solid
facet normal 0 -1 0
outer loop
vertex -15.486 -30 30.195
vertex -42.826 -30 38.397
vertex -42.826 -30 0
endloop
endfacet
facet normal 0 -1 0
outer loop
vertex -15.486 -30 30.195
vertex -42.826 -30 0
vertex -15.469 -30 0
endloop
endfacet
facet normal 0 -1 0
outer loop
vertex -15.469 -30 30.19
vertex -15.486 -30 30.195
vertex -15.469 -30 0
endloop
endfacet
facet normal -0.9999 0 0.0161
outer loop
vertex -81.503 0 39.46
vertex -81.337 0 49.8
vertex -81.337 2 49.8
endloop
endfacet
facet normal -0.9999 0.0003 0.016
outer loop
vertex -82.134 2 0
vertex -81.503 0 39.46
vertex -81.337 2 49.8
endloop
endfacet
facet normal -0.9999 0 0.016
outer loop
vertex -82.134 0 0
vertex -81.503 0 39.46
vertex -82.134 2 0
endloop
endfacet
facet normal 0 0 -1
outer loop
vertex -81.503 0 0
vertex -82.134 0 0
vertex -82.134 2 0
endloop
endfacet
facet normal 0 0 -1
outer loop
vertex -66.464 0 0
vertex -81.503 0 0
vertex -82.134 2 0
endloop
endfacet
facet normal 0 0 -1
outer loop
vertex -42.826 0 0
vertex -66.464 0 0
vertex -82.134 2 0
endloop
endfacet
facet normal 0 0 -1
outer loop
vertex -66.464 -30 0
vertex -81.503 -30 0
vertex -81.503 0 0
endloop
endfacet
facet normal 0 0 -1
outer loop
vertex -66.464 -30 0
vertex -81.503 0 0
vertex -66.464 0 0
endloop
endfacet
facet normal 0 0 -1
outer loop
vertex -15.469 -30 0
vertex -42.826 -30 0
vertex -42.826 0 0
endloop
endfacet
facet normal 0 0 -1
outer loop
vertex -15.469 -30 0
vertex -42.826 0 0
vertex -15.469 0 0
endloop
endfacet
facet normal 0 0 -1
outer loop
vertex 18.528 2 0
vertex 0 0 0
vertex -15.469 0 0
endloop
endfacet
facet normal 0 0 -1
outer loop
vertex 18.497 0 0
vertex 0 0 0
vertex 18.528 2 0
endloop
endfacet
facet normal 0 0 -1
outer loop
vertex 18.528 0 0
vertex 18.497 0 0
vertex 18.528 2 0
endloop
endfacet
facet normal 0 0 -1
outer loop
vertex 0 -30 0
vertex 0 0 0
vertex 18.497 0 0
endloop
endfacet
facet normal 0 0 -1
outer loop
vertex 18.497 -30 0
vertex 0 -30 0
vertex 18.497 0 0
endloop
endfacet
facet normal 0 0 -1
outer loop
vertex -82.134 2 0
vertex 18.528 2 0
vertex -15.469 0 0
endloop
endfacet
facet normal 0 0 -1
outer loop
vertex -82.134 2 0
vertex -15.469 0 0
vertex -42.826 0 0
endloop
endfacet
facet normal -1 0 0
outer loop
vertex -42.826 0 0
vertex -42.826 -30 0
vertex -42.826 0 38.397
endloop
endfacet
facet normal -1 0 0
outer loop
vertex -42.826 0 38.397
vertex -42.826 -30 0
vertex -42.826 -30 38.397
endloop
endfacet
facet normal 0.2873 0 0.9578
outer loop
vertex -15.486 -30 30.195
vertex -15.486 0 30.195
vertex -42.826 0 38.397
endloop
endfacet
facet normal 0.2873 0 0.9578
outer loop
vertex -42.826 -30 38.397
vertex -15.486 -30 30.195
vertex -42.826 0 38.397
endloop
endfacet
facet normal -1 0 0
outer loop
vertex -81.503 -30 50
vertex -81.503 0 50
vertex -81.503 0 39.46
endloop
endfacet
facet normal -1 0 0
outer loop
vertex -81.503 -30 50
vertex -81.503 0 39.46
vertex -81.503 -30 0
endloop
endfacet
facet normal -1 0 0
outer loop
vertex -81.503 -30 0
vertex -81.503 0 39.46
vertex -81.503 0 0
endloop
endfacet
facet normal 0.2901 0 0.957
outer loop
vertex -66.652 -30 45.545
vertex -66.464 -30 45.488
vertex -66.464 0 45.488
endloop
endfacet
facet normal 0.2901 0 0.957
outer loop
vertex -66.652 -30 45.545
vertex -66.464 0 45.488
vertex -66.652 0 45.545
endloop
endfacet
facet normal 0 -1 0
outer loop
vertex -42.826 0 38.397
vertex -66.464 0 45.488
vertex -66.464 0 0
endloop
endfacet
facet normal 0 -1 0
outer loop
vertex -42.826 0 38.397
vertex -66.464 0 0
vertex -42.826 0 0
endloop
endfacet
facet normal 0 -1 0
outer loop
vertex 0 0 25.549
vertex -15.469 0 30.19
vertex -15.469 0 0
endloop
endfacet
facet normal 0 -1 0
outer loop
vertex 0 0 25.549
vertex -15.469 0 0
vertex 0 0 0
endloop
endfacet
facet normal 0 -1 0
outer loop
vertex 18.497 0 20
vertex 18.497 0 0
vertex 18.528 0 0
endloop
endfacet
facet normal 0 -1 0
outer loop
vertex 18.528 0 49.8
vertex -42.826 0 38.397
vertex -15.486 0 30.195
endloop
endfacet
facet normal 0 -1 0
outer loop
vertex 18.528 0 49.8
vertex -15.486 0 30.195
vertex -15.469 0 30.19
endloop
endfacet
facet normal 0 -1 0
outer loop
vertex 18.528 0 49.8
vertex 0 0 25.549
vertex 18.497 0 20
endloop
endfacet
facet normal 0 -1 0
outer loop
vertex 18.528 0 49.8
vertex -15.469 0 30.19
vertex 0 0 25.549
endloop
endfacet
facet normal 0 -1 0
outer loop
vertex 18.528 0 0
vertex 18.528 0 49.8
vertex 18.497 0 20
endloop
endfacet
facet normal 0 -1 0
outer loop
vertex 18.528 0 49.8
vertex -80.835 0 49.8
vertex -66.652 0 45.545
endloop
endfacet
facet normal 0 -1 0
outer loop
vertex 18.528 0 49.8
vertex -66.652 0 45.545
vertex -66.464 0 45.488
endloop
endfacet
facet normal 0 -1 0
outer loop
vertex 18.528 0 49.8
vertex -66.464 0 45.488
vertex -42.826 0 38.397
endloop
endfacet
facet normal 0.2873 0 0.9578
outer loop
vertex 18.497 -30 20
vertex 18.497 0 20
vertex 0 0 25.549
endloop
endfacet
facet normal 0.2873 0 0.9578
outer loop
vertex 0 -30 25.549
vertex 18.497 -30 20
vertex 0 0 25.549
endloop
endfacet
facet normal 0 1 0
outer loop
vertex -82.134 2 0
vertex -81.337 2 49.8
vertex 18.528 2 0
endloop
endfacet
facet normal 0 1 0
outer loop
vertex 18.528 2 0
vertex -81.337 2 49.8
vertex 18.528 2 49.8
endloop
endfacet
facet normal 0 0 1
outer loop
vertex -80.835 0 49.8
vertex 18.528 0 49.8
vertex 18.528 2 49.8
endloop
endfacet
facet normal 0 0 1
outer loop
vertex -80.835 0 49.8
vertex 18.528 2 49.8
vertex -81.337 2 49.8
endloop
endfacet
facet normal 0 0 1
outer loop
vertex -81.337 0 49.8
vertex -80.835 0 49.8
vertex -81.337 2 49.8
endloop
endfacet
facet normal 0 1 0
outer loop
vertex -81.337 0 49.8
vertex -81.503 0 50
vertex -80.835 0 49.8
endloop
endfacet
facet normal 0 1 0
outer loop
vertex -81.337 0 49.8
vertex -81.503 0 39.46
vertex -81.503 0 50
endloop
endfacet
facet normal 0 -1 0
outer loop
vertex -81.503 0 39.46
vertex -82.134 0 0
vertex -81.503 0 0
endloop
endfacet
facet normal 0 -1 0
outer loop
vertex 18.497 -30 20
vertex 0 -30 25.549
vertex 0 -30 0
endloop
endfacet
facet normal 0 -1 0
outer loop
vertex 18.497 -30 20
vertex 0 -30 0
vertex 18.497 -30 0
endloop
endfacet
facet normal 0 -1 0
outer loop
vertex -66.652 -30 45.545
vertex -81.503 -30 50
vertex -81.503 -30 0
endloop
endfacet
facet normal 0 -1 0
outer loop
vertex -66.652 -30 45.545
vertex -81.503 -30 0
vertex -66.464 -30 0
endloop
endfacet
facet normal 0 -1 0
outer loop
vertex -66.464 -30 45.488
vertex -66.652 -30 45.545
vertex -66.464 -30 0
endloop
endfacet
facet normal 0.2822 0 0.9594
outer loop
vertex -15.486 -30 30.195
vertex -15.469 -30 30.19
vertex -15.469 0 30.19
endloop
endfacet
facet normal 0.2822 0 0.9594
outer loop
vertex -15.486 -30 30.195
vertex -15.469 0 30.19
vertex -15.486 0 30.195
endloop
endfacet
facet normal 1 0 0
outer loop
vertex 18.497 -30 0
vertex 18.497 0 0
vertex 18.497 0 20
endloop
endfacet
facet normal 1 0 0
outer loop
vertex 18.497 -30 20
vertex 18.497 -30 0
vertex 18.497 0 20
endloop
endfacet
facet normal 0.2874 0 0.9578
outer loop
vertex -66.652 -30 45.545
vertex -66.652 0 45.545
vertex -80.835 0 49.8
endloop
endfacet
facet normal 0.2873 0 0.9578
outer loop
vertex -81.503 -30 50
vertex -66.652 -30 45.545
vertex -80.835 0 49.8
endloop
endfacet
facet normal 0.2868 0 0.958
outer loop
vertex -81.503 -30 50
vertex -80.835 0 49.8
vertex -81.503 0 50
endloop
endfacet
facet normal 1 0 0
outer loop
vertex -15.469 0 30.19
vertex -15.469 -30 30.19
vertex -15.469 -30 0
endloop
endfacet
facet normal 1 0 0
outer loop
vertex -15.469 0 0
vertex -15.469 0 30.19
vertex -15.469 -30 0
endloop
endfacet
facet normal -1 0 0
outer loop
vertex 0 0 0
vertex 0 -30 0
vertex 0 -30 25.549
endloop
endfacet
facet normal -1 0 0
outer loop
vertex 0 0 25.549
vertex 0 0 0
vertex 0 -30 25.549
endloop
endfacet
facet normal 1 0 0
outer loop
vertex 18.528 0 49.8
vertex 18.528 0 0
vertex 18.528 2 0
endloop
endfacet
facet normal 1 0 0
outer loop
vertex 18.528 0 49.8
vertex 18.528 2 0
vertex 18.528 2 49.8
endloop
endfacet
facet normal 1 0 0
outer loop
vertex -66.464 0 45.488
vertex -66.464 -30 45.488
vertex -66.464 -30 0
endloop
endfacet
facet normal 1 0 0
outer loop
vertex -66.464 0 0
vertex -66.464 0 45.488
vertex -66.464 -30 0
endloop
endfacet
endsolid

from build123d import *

# Parameters (mm, degrees)
F1_DEPTH = 30
F3_DEPTH = 30.001
F5_DEPTH = 2


with BuildPart() as f1:
    # F0 (on Front) → F1 (new body)
    with BuildSketch(Plane.XZ):
        Polygon((-42.8425073624, 38.4018848052), (-42.8425073624, 0), (-15.4858445749, 0), (-15.4858445749, 30.194885969), align=None)
        Polygon((-66.6515186782, 45.5445881999), (-66.6515186782, 0), (-42.8425073624, 0), (-42.8425073624, 38.4018848052), align=None)
        Polygon((-81.502891345, 50), (-81.502891345, 0), (-66.6515186782, 0), (-66.6515186782, 45.5445881999), align=None)
        Polygon((-15.4858445749, 30.194885969), (-15.4858445749, 0), (18.497108655, 0), (18.497108655, 20), align=None)
    extrude(amount=F1_DEPTH)

    # F2 (on face) → F3 (cut, through all)
    with BuildSketch(Plane.XZ.offset(30)):
        Polygon((-66.4639249444, 45.4883100798), (-66.4639249444, 0), (-42.8256466985, 0), (-42.8256466985, 38.396826606), align=None)
        Polygon((-15.4689829797, 30.1898274904), (-15.4689829797, 0), (0, 0), (0, 25.5491325965), align=None)
    extrude(amount=-F3_DEPTH, mode=Mode.SUBTRACT)

    # F4 (on Front) → F5 (join)
    with BuildSketch(Plane.XZ):
        Polygon((18.5276474804, 49.7997477651), (-81.3374519348, 49.7997477651), (18.5276474804, 20.3182976693), align=None)
        Polygon((-81.3374519348, 0), (-81.3374519348, 49.7997477651), (-82.1342468262, 0), align=None)
        Polygon((18.5276474804, 20.3182976693), (-81.3374519348, 49.7997477651), (-81.3374519348, 0), (0, 0), (18.5276474804, 0), align=None)
    extrude(amount=-F5_DEPTH)


solid = f1.part
